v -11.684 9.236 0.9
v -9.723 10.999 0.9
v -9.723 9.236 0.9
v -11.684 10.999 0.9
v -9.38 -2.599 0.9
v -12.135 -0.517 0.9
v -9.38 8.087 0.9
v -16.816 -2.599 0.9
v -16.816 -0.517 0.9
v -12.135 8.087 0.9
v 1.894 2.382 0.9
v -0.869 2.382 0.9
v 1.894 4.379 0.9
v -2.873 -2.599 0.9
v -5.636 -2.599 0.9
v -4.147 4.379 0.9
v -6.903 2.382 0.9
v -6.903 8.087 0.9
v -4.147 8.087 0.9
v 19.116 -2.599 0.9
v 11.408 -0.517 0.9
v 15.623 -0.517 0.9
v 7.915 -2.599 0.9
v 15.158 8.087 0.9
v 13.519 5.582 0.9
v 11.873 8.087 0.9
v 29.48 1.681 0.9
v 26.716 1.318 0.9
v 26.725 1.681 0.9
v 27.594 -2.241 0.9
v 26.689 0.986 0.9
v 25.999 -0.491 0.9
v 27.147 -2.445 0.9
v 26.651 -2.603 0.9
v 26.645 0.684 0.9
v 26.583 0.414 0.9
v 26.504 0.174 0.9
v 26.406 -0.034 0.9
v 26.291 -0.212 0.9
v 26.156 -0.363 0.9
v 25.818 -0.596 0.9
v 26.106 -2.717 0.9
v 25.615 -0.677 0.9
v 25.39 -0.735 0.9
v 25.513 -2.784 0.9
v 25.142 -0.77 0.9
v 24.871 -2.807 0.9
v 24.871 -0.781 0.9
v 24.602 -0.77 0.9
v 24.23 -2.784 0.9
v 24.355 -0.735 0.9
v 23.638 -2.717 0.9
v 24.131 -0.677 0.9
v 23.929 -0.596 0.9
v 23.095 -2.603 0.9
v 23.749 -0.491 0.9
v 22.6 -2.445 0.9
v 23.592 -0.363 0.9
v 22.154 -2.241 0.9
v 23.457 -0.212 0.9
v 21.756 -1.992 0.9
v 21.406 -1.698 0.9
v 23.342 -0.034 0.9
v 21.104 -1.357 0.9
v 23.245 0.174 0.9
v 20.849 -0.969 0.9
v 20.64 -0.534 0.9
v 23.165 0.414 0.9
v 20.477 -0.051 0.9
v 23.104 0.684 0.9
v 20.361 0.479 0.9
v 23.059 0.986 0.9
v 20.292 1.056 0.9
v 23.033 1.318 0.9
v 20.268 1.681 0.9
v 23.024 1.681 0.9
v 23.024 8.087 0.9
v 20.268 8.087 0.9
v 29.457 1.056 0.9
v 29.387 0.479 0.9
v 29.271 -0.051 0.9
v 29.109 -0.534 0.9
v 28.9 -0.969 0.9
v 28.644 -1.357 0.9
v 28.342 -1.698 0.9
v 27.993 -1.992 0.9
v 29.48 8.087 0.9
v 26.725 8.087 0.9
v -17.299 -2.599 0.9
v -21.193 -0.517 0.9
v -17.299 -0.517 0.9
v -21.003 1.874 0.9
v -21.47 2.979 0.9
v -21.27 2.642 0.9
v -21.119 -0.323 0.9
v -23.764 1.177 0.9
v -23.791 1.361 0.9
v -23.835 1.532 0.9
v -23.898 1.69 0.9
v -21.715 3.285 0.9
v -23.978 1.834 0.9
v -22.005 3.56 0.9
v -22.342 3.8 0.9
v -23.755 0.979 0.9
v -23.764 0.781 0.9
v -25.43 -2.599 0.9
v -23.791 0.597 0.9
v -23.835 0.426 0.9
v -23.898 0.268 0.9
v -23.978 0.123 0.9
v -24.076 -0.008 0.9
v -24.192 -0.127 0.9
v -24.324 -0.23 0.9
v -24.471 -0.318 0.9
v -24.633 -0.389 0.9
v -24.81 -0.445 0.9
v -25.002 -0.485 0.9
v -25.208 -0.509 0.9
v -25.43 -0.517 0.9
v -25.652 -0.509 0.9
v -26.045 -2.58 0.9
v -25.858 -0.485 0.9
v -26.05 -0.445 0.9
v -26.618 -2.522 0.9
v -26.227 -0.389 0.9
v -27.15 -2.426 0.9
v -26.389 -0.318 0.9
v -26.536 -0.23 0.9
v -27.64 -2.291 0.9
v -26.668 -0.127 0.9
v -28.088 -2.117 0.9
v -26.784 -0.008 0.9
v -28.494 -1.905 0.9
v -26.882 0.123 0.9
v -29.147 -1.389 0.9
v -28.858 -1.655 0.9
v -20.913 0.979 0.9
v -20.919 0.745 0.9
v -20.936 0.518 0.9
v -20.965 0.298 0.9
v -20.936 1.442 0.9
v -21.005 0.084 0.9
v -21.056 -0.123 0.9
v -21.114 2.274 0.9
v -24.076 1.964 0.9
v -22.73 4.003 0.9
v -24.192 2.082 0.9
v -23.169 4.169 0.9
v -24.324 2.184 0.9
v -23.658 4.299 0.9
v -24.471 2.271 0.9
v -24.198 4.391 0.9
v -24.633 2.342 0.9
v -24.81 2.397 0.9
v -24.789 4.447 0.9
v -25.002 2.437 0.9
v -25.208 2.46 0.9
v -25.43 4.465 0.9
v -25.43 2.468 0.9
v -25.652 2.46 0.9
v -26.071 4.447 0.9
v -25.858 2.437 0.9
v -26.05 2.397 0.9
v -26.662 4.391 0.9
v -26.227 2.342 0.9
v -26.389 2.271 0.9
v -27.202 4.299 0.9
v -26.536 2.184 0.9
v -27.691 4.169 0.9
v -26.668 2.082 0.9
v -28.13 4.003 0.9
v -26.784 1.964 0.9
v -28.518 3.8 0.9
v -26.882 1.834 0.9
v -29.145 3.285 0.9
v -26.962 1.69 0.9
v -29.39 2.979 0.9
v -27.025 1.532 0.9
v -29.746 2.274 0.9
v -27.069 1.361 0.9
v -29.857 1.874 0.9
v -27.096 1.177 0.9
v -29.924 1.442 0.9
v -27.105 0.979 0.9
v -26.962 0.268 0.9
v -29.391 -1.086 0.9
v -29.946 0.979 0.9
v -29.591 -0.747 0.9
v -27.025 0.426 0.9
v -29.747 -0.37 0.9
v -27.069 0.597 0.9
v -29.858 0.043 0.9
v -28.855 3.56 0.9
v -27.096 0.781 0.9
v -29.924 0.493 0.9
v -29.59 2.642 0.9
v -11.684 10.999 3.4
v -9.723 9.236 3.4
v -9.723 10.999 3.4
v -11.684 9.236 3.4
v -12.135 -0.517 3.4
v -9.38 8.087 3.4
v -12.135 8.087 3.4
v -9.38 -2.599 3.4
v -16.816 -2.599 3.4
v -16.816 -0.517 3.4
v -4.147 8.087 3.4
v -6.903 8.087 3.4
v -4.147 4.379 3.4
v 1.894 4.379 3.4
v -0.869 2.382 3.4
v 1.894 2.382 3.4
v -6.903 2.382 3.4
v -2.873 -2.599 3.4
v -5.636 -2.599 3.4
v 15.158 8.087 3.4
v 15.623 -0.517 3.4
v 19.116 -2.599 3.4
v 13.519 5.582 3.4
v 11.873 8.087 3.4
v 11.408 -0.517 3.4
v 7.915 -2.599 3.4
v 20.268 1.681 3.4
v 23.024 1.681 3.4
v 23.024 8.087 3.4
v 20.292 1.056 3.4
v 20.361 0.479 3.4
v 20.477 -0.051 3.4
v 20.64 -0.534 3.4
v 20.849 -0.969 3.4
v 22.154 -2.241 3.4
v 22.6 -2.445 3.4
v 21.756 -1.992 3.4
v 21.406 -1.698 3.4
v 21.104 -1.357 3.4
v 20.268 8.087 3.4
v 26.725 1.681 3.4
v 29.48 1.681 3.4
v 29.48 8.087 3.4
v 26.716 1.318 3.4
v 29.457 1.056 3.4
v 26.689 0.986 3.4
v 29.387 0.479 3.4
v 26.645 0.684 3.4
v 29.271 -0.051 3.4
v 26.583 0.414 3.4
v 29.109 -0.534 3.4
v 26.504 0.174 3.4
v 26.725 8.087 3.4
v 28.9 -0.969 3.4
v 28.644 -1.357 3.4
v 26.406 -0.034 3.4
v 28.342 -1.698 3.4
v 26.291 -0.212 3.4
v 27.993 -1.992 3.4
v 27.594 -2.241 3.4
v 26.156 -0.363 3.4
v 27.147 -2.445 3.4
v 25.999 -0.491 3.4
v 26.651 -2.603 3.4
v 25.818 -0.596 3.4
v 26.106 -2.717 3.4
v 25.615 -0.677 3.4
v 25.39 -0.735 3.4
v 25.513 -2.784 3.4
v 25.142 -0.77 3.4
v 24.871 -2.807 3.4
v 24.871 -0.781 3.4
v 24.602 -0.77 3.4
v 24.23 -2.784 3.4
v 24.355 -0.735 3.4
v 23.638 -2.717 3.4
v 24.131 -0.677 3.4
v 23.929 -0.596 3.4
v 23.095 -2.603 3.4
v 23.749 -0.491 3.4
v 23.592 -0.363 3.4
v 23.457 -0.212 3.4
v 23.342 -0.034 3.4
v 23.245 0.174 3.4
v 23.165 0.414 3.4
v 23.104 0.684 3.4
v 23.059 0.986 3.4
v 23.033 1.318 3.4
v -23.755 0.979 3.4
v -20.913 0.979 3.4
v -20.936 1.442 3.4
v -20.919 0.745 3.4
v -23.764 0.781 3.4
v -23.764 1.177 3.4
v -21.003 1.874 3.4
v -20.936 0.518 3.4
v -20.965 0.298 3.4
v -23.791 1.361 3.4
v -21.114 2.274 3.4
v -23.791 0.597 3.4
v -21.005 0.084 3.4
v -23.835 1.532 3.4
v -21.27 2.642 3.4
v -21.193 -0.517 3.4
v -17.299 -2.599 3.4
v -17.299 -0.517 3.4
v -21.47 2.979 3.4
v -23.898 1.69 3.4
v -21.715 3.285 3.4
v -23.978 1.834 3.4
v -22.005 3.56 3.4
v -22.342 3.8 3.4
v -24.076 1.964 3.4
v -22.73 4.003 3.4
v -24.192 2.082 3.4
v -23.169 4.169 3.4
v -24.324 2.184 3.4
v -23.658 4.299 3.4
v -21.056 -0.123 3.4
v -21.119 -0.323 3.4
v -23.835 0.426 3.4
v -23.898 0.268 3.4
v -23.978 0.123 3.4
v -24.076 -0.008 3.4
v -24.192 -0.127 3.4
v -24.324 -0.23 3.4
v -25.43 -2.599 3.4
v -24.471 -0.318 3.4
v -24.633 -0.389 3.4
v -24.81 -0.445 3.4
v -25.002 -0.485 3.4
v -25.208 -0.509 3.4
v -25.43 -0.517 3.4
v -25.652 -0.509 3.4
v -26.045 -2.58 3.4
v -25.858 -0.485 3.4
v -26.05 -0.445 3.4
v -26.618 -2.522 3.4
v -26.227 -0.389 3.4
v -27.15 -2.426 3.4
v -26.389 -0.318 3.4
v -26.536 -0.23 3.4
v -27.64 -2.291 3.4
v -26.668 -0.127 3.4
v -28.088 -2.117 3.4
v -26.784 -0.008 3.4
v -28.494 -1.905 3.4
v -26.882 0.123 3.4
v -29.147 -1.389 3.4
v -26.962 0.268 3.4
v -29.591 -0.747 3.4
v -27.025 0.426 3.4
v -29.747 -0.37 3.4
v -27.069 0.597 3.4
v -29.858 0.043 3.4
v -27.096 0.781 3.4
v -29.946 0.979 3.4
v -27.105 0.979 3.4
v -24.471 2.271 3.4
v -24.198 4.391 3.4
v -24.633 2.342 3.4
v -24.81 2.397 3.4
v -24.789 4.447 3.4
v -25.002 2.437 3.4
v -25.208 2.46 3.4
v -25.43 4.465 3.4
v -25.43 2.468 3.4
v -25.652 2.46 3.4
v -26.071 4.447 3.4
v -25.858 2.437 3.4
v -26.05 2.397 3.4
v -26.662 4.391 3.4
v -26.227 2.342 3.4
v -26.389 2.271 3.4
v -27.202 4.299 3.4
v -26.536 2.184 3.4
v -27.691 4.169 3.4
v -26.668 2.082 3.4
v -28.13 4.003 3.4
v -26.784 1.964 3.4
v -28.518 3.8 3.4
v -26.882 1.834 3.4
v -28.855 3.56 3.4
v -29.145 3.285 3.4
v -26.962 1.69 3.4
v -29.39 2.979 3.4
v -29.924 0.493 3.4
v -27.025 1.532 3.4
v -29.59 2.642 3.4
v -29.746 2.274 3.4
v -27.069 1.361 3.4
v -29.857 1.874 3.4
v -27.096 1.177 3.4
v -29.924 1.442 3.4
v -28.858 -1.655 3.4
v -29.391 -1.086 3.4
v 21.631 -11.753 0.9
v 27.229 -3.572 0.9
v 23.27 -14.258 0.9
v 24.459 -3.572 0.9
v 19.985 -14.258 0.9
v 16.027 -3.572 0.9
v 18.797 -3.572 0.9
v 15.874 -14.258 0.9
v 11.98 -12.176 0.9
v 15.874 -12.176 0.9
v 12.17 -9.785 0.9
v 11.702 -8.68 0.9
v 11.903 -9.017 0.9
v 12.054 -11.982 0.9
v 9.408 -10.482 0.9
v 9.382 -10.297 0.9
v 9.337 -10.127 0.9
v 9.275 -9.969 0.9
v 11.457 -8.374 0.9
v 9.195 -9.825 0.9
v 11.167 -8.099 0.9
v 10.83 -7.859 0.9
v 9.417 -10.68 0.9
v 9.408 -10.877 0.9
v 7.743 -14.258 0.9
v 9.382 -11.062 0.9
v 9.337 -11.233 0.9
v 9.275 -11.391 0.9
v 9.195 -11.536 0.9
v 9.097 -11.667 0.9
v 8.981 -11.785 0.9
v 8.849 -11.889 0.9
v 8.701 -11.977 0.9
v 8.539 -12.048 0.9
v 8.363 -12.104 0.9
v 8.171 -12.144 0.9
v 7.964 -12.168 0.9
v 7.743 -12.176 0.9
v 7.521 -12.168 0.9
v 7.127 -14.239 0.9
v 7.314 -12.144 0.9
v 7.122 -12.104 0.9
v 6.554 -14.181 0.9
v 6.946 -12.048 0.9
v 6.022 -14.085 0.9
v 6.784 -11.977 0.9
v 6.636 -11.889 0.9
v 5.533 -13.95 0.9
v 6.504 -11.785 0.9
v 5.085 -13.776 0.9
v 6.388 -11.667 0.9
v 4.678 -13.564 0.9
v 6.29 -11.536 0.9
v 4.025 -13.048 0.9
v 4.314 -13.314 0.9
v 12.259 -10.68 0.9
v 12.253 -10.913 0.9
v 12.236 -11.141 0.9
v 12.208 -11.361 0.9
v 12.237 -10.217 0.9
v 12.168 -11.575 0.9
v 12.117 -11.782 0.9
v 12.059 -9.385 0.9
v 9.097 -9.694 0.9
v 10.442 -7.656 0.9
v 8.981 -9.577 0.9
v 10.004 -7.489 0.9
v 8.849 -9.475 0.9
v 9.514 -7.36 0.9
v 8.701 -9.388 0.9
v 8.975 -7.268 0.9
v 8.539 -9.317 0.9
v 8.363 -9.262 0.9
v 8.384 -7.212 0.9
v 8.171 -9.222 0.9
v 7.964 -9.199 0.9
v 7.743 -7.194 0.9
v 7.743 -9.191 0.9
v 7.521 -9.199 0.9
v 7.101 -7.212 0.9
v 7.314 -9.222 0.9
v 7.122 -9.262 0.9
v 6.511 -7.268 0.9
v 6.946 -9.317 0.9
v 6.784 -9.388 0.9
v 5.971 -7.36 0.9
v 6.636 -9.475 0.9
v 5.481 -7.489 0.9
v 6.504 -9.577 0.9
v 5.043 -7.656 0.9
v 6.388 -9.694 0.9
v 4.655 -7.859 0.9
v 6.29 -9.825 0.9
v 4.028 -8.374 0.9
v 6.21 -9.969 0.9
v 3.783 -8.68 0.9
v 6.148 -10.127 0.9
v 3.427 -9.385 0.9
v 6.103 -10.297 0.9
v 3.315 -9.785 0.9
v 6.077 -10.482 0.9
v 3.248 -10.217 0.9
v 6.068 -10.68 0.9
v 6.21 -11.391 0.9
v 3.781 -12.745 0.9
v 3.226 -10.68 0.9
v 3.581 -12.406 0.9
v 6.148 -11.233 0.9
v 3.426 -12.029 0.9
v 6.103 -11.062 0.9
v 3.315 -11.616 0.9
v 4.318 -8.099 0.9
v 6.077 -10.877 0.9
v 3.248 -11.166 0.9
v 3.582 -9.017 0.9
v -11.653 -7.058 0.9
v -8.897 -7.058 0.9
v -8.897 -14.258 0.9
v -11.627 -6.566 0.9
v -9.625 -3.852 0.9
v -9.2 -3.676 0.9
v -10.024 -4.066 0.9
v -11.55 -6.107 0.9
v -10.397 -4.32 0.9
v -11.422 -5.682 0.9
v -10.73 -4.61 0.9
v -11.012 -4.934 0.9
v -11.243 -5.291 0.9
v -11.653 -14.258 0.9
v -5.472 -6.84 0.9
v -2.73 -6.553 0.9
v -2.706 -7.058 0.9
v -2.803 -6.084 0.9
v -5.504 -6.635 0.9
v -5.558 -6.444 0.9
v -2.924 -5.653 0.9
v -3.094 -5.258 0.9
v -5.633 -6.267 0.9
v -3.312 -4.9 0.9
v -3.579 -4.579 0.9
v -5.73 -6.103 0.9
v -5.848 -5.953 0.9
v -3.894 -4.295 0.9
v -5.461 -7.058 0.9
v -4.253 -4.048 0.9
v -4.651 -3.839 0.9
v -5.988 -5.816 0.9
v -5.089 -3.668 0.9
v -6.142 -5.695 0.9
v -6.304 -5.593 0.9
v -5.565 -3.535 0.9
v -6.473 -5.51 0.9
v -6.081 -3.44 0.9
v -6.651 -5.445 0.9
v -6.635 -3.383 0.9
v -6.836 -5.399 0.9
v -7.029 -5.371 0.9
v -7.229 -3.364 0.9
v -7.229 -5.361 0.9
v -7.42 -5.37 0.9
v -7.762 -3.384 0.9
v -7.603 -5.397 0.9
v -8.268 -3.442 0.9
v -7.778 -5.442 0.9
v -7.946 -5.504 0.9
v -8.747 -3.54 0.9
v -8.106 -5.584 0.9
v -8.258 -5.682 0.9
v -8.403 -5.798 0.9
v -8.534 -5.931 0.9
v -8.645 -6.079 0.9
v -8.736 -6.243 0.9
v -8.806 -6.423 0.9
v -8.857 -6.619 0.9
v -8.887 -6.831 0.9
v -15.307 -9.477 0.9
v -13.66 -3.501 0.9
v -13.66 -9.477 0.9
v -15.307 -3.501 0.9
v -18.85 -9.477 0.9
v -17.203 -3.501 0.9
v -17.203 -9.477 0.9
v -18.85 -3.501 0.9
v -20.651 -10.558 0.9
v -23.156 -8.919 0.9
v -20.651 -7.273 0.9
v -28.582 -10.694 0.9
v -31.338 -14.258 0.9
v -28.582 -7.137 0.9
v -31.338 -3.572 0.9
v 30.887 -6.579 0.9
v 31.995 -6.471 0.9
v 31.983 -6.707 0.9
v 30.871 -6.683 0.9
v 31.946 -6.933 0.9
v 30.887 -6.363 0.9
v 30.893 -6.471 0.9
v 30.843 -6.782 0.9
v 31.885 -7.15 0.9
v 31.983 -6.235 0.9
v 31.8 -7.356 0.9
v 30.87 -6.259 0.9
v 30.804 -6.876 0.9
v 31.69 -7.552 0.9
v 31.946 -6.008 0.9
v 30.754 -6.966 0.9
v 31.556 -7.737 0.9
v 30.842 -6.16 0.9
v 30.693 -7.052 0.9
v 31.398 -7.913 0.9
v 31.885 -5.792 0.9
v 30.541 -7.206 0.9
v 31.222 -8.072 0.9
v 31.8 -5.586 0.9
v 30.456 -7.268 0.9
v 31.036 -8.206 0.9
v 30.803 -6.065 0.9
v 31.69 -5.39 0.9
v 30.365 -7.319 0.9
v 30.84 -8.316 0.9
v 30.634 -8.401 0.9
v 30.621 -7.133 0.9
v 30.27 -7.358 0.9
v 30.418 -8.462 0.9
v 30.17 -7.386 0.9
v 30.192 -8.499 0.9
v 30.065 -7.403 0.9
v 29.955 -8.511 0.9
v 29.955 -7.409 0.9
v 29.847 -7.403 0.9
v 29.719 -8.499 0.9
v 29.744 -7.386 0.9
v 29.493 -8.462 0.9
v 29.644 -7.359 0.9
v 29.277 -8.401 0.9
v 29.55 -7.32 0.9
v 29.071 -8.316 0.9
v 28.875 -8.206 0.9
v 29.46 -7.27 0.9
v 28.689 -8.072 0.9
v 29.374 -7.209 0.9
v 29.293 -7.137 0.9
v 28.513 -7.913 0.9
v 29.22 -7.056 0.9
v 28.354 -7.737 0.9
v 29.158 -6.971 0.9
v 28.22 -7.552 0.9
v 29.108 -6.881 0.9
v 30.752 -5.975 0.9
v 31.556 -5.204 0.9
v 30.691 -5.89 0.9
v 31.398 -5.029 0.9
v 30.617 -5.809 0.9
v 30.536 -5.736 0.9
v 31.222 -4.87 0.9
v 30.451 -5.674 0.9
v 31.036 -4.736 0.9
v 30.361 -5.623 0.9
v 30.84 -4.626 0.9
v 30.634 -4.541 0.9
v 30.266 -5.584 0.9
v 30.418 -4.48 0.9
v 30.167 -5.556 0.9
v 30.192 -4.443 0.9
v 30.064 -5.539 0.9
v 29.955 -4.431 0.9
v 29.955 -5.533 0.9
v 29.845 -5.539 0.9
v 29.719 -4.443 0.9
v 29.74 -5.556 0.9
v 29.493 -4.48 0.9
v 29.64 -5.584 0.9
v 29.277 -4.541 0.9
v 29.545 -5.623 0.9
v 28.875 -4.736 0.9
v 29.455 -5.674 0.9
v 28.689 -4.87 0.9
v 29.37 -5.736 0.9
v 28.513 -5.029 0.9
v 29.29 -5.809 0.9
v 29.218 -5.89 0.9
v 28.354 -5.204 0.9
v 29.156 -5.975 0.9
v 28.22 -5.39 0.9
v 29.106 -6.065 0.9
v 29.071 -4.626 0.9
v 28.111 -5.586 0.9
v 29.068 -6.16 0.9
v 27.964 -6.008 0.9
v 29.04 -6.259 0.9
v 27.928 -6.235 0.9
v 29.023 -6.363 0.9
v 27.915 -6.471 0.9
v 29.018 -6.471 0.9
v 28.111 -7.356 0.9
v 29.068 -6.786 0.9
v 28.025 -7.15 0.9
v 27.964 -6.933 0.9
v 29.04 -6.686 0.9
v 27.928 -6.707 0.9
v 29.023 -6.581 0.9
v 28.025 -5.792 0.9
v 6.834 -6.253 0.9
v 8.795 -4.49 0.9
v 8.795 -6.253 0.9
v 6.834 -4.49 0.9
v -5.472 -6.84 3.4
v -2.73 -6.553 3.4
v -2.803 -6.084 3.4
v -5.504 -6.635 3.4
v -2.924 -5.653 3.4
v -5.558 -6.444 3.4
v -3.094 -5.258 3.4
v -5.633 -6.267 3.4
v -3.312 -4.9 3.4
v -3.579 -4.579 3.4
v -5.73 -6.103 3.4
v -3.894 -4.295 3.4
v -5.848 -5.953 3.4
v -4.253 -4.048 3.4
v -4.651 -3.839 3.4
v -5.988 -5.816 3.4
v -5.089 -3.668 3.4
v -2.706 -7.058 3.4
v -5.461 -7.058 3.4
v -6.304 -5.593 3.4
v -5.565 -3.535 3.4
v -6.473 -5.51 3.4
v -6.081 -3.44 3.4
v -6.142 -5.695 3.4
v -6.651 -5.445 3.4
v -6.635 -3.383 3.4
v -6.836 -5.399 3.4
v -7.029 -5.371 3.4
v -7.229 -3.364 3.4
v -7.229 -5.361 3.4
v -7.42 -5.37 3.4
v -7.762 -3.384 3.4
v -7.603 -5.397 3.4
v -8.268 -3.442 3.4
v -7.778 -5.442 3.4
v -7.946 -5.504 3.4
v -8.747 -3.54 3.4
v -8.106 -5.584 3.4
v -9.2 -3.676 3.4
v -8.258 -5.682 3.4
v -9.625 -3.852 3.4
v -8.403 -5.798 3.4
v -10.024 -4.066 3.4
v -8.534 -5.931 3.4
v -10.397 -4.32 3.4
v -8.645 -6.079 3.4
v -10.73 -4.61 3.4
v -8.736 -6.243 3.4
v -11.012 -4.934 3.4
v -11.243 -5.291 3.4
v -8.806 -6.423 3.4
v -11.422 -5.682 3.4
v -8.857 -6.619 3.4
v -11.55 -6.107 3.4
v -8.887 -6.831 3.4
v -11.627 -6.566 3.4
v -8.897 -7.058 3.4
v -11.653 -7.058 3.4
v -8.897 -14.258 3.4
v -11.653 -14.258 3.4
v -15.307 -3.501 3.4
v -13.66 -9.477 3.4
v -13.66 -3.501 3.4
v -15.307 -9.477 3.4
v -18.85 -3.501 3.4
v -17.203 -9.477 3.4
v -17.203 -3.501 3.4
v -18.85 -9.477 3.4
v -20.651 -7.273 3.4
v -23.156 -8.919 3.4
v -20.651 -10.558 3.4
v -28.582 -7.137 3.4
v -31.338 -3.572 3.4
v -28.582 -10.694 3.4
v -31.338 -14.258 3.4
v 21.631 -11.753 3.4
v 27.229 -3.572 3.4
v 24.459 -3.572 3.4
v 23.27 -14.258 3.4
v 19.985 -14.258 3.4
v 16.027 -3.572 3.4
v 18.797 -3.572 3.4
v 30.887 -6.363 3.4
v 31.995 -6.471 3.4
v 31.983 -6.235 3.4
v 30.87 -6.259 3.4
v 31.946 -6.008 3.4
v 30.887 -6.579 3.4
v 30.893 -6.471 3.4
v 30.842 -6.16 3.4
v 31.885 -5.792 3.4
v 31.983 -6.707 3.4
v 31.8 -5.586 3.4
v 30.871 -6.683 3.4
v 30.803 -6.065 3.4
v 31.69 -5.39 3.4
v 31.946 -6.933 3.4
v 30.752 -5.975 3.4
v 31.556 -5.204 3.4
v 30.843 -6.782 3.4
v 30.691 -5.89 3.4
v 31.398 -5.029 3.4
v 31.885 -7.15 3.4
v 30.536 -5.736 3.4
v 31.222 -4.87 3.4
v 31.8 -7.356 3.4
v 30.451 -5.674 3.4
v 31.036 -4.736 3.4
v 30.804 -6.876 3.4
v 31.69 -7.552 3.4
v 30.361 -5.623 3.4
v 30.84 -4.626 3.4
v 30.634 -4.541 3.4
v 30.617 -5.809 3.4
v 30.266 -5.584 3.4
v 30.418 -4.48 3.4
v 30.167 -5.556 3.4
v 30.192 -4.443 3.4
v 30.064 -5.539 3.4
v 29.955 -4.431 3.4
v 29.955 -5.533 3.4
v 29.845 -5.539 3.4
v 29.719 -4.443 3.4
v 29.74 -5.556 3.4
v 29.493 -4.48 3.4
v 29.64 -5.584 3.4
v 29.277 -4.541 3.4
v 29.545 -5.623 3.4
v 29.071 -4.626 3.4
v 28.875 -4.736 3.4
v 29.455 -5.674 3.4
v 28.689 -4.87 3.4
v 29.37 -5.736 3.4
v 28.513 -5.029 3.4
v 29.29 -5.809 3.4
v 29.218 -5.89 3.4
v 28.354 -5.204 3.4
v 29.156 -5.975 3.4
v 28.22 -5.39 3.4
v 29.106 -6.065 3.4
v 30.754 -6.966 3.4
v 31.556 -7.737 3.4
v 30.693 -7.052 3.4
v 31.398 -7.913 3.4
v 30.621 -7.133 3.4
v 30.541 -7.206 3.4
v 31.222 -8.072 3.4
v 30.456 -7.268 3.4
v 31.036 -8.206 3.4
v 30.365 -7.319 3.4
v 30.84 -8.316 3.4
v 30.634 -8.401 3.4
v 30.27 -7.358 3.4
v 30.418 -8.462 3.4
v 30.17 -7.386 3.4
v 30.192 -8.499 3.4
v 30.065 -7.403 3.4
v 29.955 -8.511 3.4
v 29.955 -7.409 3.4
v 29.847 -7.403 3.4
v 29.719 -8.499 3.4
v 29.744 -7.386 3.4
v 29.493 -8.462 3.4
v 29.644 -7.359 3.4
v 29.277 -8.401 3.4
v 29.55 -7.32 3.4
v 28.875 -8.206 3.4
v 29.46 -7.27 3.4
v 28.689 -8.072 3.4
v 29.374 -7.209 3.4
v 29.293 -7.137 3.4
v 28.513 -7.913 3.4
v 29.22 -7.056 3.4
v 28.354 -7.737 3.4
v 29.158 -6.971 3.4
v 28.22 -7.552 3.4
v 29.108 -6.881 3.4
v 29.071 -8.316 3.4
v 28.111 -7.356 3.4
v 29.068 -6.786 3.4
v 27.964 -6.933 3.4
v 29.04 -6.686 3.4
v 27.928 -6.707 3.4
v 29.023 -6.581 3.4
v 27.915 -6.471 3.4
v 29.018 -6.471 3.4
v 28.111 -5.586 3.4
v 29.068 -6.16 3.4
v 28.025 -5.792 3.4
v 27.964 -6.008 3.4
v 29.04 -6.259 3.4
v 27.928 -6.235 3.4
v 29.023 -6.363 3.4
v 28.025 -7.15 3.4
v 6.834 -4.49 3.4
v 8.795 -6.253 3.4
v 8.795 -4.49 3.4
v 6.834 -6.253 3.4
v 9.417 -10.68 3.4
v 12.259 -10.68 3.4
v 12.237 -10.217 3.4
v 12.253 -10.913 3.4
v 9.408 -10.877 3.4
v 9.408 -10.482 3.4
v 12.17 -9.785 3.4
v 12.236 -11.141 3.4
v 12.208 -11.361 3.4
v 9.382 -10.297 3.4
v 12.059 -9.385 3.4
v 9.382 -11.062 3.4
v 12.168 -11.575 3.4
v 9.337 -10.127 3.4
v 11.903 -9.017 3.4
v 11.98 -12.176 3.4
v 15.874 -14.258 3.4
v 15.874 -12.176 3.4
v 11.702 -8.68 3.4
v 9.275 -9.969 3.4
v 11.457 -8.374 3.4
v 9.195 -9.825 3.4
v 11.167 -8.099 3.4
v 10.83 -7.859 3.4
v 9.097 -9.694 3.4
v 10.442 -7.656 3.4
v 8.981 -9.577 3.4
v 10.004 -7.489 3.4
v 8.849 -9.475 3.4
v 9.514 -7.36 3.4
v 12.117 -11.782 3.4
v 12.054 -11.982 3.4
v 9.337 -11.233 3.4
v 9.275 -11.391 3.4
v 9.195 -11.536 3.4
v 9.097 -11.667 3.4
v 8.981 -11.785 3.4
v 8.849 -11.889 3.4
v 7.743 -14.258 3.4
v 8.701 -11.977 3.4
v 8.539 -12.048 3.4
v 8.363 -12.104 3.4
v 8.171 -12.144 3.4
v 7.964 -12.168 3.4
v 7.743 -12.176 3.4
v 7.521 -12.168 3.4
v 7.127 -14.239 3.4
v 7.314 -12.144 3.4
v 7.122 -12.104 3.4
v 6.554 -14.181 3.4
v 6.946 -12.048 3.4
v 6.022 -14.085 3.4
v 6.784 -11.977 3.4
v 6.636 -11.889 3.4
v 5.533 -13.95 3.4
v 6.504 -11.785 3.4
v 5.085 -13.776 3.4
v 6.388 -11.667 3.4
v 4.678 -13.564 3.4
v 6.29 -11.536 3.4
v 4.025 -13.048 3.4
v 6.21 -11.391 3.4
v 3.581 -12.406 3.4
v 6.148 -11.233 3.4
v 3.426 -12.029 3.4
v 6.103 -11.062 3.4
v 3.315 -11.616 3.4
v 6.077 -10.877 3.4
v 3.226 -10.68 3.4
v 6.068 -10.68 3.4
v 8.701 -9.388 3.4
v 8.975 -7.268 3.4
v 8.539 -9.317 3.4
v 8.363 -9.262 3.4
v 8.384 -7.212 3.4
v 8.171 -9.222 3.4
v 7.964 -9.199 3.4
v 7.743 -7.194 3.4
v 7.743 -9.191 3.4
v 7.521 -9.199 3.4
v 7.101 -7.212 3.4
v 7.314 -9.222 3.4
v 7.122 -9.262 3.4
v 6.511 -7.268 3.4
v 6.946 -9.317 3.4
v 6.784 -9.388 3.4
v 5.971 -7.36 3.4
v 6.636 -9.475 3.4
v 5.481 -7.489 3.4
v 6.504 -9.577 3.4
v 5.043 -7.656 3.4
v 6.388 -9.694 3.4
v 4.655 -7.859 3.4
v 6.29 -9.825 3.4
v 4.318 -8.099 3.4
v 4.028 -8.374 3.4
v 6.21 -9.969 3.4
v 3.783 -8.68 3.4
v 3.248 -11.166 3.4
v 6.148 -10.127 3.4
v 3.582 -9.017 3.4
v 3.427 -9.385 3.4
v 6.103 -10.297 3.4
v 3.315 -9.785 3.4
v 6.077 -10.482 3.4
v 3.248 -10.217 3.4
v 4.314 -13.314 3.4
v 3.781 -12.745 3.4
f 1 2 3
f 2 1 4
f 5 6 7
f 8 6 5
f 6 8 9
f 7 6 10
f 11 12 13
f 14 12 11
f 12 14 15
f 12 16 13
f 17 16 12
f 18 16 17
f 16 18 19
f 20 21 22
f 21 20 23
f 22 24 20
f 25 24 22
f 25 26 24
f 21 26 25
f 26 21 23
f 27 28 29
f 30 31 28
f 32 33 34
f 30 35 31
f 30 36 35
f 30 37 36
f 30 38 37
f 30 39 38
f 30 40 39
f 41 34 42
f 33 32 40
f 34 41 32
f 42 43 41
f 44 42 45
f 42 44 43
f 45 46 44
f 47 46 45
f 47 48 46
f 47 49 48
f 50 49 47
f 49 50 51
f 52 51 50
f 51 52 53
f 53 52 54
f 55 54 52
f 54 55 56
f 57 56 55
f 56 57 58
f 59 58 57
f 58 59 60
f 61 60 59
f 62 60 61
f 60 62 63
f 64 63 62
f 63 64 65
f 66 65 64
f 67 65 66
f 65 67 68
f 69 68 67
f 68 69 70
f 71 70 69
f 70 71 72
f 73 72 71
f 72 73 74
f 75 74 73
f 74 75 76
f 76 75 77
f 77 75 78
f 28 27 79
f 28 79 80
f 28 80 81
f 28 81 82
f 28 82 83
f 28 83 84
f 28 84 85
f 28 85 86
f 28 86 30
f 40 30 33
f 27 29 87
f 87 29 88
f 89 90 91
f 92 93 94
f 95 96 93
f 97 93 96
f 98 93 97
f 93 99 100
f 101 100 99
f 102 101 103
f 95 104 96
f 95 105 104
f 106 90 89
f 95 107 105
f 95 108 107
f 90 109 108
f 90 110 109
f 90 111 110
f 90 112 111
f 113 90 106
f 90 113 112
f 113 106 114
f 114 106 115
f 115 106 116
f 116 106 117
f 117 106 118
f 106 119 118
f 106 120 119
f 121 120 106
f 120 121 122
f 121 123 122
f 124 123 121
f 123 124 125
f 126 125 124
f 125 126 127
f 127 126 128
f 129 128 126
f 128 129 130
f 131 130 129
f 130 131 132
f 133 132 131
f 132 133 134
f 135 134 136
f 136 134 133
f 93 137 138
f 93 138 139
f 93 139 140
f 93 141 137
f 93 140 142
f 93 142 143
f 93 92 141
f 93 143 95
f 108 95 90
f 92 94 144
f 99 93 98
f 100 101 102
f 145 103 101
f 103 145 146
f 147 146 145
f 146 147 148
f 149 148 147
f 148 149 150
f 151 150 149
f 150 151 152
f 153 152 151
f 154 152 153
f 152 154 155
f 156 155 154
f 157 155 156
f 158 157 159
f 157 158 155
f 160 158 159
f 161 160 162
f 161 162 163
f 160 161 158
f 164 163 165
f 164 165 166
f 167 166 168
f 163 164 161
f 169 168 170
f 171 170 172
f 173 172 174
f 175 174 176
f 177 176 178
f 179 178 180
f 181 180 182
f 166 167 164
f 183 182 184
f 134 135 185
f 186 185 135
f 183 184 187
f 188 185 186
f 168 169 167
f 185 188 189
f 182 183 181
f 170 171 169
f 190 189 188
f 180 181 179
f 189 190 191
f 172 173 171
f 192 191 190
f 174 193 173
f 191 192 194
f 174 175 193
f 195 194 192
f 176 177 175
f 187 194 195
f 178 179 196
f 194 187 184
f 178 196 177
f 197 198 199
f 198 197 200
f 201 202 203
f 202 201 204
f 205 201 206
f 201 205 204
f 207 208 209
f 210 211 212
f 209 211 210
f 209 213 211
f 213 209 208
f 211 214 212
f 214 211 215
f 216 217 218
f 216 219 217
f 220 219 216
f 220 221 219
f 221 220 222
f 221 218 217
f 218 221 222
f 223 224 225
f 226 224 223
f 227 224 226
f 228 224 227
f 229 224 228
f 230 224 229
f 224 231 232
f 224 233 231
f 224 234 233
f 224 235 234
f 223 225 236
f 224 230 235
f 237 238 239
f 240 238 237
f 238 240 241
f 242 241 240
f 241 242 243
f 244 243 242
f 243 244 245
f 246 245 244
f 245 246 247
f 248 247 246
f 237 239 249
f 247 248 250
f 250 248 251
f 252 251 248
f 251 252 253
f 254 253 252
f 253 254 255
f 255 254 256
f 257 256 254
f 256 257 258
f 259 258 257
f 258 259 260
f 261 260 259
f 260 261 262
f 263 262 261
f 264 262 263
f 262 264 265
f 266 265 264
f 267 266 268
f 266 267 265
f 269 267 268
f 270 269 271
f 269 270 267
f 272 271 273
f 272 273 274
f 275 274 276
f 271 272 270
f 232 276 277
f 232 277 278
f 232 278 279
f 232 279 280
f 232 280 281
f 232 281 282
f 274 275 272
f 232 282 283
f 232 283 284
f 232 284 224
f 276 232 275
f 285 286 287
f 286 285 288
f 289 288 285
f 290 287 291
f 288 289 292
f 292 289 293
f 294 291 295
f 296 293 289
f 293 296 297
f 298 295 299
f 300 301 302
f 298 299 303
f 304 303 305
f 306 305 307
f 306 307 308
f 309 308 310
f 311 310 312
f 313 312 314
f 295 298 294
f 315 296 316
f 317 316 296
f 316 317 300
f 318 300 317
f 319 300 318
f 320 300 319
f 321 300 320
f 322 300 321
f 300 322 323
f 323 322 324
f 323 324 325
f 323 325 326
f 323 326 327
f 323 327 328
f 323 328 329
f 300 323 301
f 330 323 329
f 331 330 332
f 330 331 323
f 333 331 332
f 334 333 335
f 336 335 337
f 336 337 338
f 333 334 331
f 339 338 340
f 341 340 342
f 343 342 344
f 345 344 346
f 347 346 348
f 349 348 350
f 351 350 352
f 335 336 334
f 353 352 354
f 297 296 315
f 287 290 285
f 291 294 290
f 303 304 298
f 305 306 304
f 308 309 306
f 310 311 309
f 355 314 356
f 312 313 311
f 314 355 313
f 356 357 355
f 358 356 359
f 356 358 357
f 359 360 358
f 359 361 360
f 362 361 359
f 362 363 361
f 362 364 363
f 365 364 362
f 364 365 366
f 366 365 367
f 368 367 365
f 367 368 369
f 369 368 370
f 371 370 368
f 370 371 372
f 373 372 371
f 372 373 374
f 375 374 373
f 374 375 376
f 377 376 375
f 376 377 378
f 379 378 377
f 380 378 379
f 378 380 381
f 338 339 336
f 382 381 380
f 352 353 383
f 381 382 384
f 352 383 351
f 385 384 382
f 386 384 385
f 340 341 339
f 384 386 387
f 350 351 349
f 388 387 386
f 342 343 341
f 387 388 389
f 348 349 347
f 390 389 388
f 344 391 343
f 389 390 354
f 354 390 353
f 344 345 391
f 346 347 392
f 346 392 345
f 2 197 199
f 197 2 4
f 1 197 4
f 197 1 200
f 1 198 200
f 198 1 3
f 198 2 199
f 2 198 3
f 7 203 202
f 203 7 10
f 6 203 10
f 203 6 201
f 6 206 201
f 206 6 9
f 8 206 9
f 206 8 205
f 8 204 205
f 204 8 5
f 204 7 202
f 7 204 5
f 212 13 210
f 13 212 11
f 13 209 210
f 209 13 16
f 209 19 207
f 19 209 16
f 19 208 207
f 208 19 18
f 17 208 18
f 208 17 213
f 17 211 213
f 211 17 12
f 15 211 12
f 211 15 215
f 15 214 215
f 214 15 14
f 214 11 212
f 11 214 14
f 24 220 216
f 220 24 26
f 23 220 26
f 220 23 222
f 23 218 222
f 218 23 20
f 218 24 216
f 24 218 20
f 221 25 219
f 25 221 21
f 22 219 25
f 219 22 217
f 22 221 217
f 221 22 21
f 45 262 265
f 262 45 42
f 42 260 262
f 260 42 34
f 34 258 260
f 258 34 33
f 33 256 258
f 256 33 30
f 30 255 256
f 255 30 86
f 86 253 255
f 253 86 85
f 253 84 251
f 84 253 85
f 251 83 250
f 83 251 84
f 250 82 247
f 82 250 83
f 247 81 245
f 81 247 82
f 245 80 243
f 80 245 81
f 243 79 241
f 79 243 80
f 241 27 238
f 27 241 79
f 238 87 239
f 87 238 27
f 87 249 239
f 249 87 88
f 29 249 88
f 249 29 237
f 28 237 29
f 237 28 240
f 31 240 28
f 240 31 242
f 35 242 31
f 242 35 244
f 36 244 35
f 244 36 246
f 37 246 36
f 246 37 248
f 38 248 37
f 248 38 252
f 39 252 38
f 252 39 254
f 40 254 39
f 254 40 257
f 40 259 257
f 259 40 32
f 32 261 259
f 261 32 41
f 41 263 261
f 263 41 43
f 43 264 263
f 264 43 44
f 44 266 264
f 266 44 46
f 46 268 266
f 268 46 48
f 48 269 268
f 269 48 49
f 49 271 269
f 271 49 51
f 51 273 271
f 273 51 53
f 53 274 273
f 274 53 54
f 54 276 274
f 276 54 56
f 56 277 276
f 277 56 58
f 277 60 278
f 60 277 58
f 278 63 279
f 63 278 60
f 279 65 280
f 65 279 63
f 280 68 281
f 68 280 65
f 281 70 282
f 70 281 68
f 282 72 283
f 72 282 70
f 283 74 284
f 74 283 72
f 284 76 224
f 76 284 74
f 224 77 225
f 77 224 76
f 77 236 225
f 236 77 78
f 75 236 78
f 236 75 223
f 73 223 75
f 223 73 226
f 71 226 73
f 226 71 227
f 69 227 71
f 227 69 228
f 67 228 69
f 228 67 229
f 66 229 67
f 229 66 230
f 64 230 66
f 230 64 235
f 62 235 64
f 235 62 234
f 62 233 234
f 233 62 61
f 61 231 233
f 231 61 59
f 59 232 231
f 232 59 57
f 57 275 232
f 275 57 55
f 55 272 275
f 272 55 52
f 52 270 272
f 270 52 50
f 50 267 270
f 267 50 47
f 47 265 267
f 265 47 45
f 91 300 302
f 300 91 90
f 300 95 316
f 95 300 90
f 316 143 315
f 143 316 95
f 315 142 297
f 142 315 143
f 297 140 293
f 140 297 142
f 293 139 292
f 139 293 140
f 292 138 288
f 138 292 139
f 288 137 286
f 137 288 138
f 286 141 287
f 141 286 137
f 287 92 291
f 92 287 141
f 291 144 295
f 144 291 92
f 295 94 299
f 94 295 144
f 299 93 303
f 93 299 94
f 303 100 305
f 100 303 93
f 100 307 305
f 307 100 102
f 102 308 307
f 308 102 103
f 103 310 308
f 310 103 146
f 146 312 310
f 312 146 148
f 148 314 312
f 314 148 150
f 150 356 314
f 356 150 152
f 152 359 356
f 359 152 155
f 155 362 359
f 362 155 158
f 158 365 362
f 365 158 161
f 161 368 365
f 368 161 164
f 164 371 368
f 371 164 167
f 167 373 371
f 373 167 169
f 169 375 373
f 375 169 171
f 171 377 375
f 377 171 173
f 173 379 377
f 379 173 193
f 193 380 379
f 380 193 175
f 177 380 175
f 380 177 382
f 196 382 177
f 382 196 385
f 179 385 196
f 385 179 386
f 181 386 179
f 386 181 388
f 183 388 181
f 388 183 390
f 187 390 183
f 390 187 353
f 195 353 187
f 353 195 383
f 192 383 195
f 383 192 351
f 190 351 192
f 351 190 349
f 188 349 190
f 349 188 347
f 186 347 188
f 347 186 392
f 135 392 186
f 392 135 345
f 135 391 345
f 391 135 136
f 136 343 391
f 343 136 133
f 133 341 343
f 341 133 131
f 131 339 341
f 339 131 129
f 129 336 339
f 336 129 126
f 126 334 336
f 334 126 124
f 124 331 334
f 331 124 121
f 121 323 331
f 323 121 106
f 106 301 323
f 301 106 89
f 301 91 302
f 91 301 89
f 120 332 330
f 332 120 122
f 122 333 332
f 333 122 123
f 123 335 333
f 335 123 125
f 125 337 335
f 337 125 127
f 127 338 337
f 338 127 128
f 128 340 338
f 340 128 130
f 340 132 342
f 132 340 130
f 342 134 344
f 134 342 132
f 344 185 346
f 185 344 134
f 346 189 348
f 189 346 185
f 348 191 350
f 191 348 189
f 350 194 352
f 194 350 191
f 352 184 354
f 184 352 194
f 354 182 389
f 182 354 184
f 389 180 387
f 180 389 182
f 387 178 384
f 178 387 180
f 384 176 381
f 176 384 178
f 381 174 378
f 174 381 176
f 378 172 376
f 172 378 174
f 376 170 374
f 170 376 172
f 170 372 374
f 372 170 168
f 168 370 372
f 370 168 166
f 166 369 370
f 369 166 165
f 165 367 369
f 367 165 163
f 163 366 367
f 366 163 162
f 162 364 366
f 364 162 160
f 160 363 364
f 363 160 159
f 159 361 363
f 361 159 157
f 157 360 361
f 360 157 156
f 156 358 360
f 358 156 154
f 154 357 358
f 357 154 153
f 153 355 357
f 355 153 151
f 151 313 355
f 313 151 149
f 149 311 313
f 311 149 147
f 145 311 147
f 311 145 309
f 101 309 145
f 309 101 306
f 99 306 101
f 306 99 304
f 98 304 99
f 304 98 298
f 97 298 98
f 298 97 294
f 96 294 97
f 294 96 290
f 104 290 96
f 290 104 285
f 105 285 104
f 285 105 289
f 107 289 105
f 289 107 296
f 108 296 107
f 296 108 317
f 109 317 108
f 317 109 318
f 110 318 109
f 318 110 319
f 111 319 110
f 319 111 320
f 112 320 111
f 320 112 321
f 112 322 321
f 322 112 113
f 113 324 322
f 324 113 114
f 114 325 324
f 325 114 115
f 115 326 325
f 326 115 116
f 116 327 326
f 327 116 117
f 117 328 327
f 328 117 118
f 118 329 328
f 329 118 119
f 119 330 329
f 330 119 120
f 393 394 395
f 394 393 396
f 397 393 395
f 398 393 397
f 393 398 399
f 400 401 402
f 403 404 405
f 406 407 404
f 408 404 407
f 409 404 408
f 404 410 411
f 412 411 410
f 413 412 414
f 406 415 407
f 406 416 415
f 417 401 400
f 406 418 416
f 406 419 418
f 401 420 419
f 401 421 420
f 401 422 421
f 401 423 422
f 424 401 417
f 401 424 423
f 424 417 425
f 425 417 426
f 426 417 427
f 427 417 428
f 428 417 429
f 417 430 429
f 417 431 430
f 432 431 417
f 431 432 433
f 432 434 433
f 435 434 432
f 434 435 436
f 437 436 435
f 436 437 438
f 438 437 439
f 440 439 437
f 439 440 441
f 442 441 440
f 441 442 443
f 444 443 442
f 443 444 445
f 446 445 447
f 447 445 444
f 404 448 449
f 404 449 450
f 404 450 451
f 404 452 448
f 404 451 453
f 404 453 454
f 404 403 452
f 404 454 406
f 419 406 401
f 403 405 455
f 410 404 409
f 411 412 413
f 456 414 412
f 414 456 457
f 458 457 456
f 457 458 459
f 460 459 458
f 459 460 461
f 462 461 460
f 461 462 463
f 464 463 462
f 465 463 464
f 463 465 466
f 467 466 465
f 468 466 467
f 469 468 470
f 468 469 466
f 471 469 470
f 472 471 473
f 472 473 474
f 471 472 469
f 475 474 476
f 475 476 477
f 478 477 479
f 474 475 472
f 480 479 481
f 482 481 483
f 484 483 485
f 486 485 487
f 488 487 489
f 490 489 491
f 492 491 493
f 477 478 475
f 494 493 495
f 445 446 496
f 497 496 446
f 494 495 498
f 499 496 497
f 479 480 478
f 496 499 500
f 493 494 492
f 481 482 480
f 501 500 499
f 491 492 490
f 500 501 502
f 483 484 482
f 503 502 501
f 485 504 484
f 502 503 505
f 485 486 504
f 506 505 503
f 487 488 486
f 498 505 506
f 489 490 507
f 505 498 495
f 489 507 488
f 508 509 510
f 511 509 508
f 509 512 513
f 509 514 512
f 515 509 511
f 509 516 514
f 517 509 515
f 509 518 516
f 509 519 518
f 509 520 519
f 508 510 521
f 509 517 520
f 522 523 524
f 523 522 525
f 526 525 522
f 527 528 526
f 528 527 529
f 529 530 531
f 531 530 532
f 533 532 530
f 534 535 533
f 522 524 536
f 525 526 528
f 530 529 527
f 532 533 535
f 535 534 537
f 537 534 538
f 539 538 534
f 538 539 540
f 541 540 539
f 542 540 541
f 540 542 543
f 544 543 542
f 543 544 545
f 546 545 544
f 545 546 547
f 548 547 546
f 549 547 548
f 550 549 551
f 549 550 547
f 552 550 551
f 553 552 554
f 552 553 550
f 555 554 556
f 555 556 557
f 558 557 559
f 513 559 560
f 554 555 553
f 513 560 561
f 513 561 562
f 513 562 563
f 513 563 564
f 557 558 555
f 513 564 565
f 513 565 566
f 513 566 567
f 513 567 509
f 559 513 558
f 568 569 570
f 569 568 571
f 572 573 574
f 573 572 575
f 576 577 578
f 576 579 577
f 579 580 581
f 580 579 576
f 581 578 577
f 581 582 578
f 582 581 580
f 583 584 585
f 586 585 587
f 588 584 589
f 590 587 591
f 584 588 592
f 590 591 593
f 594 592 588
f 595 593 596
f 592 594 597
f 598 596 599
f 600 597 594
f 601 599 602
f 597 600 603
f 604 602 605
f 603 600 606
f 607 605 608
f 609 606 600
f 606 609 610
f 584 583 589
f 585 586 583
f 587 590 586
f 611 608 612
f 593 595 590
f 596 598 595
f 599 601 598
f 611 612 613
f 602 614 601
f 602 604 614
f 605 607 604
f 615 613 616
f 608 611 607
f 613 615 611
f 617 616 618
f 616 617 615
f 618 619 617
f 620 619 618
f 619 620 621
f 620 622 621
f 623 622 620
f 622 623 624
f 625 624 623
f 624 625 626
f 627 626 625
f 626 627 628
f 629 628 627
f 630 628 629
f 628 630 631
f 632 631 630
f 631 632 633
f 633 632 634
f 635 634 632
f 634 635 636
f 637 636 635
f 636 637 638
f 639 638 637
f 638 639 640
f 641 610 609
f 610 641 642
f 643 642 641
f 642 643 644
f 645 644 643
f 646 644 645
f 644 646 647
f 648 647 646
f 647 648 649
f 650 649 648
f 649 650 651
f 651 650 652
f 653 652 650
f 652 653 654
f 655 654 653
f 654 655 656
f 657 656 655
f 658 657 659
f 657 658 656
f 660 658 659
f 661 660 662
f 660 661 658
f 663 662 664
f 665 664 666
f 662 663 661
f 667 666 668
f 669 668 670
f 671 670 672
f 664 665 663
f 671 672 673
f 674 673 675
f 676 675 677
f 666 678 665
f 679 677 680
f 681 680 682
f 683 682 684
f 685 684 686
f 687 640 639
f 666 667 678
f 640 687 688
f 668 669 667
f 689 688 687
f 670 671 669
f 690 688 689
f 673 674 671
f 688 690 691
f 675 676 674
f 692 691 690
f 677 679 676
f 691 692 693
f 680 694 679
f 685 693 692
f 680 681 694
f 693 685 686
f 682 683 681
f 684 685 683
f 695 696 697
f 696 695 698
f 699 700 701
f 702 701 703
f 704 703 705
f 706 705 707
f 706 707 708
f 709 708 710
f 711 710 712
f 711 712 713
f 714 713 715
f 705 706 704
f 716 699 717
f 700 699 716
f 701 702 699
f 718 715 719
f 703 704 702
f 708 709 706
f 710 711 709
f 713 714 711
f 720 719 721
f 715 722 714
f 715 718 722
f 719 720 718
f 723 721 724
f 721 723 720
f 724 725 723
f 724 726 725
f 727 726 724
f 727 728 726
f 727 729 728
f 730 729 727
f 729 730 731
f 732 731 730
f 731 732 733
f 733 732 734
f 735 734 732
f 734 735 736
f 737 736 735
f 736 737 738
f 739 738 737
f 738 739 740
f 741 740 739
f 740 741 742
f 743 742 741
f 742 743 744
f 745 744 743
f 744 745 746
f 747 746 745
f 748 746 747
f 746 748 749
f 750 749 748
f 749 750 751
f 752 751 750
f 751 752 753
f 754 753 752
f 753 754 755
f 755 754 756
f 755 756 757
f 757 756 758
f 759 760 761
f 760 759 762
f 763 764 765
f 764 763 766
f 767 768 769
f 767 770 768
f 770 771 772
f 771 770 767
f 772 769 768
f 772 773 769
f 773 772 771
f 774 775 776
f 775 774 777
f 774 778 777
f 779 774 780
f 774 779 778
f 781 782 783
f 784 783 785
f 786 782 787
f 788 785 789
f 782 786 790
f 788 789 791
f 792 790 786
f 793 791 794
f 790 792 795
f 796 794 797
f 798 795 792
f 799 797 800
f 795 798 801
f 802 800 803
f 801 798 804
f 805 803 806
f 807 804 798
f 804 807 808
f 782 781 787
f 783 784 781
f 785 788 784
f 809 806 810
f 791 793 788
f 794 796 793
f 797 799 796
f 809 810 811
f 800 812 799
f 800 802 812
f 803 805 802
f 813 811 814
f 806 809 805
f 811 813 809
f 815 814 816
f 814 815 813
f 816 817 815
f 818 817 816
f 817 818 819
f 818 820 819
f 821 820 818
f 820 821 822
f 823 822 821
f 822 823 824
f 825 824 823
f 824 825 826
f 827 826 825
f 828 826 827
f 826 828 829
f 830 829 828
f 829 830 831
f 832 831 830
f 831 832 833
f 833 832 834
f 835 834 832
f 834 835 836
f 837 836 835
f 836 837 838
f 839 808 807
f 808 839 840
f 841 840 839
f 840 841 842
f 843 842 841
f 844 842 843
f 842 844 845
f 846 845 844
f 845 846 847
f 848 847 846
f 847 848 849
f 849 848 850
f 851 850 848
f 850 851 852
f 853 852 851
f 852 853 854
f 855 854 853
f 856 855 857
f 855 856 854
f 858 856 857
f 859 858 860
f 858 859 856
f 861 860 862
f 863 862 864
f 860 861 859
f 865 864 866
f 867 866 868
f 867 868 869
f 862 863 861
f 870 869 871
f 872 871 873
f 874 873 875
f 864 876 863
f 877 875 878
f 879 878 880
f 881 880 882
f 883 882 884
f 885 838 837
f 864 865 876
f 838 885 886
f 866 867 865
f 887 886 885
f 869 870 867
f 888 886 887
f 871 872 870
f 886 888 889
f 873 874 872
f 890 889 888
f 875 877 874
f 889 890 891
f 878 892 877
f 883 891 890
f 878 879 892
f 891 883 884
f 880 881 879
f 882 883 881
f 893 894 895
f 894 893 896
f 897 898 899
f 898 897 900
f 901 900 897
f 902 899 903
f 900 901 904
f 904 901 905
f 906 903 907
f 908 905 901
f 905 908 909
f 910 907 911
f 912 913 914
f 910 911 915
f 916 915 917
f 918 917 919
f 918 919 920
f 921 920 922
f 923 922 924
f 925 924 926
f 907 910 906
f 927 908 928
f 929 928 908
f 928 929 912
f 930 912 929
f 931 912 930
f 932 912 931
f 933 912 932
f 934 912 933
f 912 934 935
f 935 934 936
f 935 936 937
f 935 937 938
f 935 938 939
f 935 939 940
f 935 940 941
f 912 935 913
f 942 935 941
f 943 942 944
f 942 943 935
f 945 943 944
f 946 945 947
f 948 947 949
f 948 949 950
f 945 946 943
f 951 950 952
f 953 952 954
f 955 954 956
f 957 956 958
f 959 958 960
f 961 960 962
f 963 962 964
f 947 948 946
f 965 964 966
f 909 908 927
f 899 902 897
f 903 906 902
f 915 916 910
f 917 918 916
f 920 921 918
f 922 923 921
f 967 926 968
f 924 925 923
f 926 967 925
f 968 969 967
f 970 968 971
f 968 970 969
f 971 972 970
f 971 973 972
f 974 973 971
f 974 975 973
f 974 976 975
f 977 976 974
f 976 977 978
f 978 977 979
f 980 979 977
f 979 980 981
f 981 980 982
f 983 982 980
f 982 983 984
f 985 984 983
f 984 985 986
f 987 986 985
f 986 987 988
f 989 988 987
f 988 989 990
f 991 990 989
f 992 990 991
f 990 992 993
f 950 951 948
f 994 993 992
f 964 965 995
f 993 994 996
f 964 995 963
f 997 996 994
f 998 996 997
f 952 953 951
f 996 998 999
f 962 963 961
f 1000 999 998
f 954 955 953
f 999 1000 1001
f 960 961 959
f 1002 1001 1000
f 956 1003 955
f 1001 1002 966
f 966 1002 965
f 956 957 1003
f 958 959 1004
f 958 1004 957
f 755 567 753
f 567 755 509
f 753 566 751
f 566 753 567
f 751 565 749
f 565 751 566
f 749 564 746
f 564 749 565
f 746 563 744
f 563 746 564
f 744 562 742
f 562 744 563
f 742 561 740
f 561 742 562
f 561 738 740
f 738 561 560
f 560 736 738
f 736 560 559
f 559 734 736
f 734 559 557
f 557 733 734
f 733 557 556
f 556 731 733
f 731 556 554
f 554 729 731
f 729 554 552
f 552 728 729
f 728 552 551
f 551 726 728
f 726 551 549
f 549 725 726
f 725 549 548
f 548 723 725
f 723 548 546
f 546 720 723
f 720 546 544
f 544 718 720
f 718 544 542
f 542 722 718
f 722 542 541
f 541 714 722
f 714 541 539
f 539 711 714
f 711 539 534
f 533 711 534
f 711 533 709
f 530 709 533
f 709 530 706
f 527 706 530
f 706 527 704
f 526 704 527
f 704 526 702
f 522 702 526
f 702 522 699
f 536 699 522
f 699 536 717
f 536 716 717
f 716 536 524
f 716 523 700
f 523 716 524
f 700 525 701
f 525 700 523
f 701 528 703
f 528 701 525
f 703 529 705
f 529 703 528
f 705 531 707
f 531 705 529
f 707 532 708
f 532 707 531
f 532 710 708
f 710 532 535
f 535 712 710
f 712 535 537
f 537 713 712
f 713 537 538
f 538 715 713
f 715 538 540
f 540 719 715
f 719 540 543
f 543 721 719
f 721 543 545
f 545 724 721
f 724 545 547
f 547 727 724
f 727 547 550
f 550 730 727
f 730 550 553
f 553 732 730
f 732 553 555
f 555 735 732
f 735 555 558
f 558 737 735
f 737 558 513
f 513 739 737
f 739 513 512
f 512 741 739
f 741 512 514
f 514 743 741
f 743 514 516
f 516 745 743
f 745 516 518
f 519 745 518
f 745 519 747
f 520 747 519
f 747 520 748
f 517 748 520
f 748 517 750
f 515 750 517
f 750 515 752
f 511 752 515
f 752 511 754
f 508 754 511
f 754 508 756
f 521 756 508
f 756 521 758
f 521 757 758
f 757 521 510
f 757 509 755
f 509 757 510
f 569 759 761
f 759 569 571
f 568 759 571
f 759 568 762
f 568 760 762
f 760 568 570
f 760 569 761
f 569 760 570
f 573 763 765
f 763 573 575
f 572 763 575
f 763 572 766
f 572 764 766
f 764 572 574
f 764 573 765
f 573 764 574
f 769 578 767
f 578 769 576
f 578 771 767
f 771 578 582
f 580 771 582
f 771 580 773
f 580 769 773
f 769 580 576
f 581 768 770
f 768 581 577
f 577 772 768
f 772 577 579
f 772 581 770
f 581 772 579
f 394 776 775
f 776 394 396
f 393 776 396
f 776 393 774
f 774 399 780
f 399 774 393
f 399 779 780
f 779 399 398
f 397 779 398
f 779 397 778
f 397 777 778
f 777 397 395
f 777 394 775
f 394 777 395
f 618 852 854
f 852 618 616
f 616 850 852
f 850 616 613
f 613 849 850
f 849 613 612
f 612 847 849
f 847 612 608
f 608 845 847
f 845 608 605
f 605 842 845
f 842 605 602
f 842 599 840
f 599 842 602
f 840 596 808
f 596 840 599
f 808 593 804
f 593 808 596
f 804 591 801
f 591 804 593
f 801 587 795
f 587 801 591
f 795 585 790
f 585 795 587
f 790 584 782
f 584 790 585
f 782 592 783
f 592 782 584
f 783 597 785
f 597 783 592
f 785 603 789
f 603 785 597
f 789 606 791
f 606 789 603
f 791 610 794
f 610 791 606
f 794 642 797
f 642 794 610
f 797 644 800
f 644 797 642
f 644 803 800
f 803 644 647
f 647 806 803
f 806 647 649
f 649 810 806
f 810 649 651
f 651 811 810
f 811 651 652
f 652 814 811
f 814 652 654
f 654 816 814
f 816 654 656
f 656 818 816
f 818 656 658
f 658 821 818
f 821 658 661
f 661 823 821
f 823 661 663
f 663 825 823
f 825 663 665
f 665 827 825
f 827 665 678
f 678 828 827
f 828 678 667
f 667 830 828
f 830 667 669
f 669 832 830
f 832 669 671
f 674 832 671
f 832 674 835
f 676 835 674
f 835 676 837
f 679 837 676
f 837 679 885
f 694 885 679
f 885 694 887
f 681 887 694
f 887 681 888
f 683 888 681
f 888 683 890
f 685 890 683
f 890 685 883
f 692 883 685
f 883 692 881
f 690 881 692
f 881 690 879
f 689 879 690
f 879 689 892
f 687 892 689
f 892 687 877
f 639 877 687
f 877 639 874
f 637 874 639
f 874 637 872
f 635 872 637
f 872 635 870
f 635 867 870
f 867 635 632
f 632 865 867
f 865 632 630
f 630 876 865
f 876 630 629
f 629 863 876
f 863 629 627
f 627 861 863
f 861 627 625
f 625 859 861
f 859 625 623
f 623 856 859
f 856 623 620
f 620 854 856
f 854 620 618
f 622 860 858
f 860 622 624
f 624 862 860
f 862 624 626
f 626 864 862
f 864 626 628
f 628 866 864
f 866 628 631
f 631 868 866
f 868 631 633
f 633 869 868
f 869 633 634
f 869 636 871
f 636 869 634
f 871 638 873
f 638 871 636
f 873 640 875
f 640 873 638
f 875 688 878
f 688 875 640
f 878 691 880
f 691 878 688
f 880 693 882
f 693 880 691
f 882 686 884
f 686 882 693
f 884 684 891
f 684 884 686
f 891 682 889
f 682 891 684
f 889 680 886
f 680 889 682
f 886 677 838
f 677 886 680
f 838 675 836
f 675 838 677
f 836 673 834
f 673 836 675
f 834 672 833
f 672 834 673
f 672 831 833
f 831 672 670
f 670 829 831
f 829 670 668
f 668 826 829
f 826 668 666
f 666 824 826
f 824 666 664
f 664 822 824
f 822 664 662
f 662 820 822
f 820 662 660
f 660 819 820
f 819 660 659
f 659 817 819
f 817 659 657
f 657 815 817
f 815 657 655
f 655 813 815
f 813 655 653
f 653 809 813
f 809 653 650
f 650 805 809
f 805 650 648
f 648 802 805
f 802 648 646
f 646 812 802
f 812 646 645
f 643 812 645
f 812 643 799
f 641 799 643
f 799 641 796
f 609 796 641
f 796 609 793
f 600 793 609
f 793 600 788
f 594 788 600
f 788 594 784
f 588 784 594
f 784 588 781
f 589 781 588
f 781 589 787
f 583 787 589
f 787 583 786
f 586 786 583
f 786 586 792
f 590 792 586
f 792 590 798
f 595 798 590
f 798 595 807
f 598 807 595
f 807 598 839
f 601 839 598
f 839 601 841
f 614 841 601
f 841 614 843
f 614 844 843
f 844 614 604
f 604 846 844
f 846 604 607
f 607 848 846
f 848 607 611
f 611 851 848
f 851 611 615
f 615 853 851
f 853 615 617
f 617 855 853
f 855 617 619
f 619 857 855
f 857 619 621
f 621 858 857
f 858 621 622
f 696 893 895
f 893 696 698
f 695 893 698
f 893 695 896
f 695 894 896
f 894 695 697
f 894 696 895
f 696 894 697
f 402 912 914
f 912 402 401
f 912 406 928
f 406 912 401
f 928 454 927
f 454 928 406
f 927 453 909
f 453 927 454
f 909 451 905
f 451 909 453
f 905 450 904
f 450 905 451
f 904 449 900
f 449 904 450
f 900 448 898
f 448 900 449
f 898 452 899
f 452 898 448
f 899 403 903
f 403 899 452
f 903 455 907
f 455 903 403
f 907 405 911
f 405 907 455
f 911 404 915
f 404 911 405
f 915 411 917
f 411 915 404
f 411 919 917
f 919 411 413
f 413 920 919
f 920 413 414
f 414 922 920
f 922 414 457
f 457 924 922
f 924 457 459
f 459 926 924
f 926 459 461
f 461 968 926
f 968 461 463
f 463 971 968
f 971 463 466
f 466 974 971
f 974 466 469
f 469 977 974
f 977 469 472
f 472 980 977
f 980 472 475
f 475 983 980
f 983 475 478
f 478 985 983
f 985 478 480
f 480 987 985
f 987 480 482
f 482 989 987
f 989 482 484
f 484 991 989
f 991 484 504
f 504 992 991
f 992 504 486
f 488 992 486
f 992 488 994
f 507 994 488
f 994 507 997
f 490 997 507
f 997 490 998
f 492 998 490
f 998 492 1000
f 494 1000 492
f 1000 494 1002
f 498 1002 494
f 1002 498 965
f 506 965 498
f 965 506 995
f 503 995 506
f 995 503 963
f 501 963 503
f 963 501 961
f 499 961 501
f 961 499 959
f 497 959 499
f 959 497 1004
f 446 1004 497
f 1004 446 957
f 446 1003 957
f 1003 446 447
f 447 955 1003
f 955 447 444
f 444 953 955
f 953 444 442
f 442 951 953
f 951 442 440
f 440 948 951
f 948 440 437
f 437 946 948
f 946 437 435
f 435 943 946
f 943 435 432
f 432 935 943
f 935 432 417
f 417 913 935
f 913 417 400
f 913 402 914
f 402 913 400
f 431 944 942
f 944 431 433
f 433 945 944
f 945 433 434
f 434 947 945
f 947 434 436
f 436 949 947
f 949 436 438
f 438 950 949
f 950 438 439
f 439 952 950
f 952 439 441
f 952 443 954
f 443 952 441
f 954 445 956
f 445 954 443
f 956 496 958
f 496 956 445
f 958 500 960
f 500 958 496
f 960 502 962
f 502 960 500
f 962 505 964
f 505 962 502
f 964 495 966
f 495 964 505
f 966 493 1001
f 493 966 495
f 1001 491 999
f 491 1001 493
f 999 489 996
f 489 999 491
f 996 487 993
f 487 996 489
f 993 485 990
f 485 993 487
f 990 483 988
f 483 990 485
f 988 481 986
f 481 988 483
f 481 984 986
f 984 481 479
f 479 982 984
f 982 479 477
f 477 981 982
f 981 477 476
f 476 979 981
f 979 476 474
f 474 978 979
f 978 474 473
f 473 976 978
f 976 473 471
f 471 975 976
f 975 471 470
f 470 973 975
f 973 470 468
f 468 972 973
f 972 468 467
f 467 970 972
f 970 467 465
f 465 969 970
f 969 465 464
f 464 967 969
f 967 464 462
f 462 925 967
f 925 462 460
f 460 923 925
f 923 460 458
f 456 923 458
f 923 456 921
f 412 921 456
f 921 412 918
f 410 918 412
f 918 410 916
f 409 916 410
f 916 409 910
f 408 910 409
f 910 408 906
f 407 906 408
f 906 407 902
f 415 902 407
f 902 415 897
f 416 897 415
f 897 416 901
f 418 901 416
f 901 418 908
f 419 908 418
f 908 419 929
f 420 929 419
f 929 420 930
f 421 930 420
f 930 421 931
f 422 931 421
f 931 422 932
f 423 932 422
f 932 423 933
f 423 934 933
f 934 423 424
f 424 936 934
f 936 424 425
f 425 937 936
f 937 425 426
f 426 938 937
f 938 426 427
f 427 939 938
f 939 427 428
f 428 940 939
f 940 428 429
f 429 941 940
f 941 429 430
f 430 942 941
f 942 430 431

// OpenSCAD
$fn = 48;
  // syllabics (overlaid on icon, tallest)
  translate([0, 3.938, 0.900]) linear_extrude(height=2.500) text("ᓇᒨᔭ ᐃᑌ", size=10.555, halign="center", valign="center", font="Euphemia UCAS:style=Bold");
  translate([0, -8.938, 0.900]) linear_extrude(height=2.500) text("ᐅᐦᒋ ᓈᐯᐤ", size=10.555, halign="center", valign="center", font="Euphemia UCAS:style=Bold");
